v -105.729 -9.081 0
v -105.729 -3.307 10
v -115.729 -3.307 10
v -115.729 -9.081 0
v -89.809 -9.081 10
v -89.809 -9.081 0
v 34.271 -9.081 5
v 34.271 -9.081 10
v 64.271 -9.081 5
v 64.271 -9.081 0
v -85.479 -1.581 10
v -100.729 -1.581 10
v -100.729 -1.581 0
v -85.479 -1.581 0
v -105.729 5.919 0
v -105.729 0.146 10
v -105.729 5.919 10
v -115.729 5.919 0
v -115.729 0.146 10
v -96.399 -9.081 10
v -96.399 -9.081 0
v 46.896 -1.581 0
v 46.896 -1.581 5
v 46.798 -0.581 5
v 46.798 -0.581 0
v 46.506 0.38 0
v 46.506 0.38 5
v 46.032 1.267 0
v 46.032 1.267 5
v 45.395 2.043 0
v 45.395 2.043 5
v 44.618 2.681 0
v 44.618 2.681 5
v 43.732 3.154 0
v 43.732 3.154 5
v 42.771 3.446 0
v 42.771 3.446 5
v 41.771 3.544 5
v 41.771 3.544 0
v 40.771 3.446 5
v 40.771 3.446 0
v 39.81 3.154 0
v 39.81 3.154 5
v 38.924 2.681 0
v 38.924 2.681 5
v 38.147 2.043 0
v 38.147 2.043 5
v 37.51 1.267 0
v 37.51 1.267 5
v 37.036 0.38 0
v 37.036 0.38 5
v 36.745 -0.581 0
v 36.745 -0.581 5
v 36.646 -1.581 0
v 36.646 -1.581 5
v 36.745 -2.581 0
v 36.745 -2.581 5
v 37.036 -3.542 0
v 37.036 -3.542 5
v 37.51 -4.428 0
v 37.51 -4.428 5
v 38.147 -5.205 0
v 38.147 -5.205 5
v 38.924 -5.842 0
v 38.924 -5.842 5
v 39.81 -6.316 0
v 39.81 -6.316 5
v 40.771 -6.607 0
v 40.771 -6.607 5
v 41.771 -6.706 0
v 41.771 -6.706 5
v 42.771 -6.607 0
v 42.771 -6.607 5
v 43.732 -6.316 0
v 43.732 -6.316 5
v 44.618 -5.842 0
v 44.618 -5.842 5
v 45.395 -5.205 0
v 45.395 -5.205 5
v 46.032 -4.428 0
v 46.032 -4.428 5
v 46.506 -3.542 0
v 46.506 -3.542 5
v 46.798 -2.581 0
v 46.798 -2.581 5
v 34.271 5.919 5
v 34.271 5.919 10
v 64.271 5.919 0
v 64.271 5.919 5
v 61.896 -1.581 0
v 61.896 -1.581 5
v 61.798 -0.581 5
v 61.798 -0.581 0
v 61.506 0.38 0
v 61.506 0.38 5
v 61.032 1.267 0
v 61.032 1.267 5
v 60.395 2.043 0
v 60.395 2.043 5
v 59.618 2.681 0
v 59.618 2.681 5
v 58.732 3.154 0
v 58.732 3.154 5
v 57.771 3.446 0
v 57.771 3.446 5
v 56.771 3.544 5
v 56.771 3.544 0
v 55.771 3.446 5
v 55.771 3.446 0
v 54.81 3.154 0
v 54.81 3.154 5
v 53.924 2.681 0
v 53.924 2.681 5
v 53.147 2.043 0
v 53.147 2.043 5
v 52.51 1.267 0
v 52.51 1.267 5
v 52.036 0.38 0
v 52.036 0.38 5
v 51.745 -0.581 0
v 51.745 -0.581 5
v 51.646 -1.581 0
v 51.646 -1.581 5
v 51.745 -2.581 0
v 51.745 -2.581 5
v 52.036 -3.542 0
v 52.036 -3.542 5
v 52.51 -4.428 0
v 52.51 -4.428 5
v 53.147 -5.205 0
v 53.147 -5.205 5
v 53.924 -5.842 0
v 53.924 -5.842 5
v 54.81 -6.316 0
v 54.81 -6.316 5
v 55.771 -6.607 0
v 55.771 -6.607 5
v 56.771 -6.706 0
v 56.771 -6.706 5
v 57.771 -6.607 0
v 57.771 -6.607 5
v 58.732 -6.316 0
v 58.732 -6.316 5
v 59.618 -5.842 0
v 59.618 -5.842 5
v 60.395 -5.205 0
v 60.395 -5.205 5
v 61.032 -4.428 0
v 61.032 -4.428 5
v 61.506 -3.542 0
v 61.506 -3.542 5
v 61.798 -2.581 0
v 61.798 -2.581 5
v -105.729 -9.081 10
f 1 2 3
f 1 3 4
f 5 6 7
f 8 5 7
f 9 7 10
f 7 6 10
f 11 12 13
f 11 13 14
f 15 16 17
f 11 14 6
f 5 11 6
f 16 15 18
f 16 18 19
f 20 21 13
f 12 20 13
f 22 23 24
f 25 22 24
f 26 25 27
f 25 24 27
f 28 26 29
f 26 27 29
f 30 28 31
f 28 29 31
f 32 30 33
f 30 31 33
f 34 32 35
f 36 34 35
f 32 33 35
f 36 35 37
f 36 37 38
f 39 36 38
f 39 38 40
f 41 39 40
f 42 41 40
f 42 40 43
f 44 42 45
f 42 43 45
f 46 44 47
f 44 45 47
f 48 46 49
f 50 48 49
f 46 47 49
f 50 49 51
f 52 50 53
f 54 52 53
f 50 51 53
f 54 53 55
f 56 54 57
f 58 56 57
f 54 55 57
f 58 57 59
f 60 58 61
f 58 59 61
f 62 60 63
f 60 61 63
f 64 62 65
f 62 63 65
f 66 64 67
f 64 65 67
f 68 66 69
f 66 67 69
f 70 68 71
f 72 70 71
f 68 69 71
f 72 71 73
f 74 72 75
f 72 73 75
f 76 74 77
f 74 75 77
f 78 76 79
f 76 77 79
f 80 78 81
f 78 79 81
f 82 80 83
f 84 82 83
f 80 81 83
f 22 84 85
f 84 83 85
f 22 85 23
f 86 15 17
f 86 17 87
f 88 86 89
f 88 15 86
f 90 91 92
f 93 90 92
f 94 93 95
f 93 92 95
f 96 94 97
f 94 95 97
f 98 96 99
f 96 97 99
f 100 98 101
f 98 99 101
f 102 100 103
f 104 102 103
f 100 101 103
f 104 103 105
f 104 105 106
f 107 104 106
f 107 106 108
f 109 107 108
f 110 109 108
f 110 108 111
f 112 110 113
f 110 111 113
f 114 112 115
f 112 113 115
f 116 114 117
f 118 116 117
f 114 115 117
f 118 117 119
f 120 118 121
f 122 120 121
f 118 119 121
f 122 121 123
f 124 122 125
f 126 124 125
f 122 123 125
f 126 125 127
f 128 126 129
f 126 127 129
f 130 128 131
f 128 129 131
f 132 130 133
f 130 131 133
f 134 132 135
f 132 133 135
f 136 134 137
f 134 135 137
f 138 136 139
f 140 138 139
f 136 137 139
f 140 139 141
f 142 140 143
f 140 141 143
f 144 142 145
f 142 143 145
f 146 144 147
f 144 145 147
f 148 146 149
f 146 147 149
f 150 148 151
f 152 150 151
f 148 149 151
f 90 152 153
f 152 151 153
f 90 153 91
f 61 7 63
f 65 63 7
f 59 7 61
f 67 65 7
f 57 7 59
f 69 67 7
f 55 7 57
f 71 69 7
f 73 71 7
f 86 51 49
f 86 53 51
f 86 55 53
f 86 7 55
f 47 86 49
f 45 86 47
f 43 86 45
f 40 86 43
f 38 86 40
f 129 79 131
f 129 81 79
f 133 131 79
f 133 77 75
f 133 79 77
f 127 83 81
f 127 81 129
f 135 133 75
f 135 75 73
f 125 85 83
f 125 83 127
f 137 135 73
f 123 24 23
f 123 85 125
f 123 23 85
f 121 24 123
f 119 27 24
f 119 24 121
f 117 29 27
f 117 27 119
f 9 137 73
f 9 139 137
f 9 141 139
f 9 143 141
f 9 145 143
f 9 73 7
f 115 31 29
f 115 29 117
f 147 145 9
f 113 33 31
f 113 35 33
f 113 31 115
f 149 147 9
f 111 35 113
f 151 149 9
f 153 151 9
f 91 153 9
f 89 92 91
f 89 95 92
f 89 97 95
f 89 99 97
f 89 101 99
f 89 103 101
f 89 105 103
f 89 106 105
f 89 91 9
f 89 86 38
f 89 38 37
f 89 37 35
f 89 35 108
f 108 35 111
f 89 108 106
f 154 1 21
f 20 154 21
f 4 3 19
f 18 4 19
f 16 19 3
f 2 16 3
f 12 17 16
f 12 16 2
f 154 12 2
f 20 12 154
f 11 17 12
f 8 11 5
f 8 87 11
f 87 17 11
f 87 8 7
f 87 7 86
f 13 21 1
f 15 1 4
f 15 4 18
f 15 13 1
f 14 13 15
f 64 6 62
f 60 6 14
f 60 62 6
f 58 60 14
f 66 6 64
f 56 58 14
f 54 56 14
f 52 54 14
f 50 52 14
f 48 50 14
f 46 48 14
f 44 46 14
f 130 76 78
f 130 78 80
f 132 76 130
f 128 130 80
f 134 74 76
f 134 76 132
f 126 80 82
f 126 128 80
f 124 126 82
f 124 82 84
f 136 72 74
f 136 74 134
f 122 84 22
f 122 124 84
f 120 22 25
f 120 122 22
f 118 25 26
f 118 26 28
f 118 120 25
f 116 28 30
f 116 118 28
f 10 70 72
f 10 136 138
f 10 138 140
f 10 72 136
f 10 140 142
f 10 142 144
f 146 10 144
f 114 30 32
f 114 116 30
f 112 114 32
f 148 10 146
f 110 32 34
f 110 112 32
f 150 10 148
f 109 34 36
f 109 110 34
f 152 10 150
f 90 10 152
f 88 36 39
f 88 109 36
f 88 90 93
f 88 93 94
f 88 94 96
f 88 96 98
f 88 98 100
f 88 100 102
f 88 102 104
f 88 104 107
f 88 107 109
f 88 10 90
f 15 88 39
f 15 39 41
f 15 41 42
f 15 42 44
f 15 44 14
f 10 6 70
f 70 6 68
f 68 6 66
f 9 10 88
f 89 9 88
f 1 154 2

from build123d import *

# Parameters (mm, degrees)
SKETCH_W        = 170
SKETCH_H        = 15
PAD_DEPTH       = 10
SKETCH001_W     = 35
SKETCH001_H     = 25
POCKET_DEPTH    = 5
PAD002_DEPTH    = 10
POCKET001_DEPTH = 10
SKETCH002_R     = 5.125
POCKET002_DEPTH = 5


with BuildPart() as part:
    # Sketch → Pad (new body)
    with BuildSketch(Plane.XY):
        with Locations((-20.728933, -1.58076)):
            Rectangle(SKETCH_W, SKETCH_H)
    extrude(amount=PAD_DEPTH)

    # Sketch001 (on Face6 of Pad) → Pocket (cut)
    with BuildSketch(Plane.XY.offset(10)):
        with Locations((51.771067, -1.58076)):
            Rectangle(SKETCH001_W, SKETCH001_H)
    extrude(amount=-POCKET_DEPTH, mode=Mode.SUBTRACT)

    # Sketch003 → Pad002 (join)
    with BuildSketch(Plane(origin=(-105.728933, 0, 0), x_dir=(0, -1, 0), z_dir=(-1, 0, 0))):
        Polygon((-5.91924, 0), (-0.145737, 10), (3.307257, 10), (9.08076, 0), align=None)
    extrude(amount=PAD002_DEPTH)

    # Sketch004 (on Face3 of Pad002) → Pocket001 (cut)
    with BuildSketch(Plane.XY.offset(10)):
        Polygon((-93.103933, -14.787648), (-100.728933, -1.58076), (-85.478933, -1.58076), align=None)
    extrude(amount=-POCKET001_DEPTH, mode=Mode.SUBTRACT)

    # Sketch002 (on Face7 of Pocket) → Pocket002 (cut)
    with BuildSketch(Plane.XY.offset(5)):
        with Locations((56.771067, -1.58076)):
            Circle(SKETCH002_R)
        with Locations((41.771067, -1.58076)):
            Circle(SKETCH002_R)
    extrude(amount=-POCKET002_DEPTH, mode=Mode.SUBTRACT)


solid = part.part
